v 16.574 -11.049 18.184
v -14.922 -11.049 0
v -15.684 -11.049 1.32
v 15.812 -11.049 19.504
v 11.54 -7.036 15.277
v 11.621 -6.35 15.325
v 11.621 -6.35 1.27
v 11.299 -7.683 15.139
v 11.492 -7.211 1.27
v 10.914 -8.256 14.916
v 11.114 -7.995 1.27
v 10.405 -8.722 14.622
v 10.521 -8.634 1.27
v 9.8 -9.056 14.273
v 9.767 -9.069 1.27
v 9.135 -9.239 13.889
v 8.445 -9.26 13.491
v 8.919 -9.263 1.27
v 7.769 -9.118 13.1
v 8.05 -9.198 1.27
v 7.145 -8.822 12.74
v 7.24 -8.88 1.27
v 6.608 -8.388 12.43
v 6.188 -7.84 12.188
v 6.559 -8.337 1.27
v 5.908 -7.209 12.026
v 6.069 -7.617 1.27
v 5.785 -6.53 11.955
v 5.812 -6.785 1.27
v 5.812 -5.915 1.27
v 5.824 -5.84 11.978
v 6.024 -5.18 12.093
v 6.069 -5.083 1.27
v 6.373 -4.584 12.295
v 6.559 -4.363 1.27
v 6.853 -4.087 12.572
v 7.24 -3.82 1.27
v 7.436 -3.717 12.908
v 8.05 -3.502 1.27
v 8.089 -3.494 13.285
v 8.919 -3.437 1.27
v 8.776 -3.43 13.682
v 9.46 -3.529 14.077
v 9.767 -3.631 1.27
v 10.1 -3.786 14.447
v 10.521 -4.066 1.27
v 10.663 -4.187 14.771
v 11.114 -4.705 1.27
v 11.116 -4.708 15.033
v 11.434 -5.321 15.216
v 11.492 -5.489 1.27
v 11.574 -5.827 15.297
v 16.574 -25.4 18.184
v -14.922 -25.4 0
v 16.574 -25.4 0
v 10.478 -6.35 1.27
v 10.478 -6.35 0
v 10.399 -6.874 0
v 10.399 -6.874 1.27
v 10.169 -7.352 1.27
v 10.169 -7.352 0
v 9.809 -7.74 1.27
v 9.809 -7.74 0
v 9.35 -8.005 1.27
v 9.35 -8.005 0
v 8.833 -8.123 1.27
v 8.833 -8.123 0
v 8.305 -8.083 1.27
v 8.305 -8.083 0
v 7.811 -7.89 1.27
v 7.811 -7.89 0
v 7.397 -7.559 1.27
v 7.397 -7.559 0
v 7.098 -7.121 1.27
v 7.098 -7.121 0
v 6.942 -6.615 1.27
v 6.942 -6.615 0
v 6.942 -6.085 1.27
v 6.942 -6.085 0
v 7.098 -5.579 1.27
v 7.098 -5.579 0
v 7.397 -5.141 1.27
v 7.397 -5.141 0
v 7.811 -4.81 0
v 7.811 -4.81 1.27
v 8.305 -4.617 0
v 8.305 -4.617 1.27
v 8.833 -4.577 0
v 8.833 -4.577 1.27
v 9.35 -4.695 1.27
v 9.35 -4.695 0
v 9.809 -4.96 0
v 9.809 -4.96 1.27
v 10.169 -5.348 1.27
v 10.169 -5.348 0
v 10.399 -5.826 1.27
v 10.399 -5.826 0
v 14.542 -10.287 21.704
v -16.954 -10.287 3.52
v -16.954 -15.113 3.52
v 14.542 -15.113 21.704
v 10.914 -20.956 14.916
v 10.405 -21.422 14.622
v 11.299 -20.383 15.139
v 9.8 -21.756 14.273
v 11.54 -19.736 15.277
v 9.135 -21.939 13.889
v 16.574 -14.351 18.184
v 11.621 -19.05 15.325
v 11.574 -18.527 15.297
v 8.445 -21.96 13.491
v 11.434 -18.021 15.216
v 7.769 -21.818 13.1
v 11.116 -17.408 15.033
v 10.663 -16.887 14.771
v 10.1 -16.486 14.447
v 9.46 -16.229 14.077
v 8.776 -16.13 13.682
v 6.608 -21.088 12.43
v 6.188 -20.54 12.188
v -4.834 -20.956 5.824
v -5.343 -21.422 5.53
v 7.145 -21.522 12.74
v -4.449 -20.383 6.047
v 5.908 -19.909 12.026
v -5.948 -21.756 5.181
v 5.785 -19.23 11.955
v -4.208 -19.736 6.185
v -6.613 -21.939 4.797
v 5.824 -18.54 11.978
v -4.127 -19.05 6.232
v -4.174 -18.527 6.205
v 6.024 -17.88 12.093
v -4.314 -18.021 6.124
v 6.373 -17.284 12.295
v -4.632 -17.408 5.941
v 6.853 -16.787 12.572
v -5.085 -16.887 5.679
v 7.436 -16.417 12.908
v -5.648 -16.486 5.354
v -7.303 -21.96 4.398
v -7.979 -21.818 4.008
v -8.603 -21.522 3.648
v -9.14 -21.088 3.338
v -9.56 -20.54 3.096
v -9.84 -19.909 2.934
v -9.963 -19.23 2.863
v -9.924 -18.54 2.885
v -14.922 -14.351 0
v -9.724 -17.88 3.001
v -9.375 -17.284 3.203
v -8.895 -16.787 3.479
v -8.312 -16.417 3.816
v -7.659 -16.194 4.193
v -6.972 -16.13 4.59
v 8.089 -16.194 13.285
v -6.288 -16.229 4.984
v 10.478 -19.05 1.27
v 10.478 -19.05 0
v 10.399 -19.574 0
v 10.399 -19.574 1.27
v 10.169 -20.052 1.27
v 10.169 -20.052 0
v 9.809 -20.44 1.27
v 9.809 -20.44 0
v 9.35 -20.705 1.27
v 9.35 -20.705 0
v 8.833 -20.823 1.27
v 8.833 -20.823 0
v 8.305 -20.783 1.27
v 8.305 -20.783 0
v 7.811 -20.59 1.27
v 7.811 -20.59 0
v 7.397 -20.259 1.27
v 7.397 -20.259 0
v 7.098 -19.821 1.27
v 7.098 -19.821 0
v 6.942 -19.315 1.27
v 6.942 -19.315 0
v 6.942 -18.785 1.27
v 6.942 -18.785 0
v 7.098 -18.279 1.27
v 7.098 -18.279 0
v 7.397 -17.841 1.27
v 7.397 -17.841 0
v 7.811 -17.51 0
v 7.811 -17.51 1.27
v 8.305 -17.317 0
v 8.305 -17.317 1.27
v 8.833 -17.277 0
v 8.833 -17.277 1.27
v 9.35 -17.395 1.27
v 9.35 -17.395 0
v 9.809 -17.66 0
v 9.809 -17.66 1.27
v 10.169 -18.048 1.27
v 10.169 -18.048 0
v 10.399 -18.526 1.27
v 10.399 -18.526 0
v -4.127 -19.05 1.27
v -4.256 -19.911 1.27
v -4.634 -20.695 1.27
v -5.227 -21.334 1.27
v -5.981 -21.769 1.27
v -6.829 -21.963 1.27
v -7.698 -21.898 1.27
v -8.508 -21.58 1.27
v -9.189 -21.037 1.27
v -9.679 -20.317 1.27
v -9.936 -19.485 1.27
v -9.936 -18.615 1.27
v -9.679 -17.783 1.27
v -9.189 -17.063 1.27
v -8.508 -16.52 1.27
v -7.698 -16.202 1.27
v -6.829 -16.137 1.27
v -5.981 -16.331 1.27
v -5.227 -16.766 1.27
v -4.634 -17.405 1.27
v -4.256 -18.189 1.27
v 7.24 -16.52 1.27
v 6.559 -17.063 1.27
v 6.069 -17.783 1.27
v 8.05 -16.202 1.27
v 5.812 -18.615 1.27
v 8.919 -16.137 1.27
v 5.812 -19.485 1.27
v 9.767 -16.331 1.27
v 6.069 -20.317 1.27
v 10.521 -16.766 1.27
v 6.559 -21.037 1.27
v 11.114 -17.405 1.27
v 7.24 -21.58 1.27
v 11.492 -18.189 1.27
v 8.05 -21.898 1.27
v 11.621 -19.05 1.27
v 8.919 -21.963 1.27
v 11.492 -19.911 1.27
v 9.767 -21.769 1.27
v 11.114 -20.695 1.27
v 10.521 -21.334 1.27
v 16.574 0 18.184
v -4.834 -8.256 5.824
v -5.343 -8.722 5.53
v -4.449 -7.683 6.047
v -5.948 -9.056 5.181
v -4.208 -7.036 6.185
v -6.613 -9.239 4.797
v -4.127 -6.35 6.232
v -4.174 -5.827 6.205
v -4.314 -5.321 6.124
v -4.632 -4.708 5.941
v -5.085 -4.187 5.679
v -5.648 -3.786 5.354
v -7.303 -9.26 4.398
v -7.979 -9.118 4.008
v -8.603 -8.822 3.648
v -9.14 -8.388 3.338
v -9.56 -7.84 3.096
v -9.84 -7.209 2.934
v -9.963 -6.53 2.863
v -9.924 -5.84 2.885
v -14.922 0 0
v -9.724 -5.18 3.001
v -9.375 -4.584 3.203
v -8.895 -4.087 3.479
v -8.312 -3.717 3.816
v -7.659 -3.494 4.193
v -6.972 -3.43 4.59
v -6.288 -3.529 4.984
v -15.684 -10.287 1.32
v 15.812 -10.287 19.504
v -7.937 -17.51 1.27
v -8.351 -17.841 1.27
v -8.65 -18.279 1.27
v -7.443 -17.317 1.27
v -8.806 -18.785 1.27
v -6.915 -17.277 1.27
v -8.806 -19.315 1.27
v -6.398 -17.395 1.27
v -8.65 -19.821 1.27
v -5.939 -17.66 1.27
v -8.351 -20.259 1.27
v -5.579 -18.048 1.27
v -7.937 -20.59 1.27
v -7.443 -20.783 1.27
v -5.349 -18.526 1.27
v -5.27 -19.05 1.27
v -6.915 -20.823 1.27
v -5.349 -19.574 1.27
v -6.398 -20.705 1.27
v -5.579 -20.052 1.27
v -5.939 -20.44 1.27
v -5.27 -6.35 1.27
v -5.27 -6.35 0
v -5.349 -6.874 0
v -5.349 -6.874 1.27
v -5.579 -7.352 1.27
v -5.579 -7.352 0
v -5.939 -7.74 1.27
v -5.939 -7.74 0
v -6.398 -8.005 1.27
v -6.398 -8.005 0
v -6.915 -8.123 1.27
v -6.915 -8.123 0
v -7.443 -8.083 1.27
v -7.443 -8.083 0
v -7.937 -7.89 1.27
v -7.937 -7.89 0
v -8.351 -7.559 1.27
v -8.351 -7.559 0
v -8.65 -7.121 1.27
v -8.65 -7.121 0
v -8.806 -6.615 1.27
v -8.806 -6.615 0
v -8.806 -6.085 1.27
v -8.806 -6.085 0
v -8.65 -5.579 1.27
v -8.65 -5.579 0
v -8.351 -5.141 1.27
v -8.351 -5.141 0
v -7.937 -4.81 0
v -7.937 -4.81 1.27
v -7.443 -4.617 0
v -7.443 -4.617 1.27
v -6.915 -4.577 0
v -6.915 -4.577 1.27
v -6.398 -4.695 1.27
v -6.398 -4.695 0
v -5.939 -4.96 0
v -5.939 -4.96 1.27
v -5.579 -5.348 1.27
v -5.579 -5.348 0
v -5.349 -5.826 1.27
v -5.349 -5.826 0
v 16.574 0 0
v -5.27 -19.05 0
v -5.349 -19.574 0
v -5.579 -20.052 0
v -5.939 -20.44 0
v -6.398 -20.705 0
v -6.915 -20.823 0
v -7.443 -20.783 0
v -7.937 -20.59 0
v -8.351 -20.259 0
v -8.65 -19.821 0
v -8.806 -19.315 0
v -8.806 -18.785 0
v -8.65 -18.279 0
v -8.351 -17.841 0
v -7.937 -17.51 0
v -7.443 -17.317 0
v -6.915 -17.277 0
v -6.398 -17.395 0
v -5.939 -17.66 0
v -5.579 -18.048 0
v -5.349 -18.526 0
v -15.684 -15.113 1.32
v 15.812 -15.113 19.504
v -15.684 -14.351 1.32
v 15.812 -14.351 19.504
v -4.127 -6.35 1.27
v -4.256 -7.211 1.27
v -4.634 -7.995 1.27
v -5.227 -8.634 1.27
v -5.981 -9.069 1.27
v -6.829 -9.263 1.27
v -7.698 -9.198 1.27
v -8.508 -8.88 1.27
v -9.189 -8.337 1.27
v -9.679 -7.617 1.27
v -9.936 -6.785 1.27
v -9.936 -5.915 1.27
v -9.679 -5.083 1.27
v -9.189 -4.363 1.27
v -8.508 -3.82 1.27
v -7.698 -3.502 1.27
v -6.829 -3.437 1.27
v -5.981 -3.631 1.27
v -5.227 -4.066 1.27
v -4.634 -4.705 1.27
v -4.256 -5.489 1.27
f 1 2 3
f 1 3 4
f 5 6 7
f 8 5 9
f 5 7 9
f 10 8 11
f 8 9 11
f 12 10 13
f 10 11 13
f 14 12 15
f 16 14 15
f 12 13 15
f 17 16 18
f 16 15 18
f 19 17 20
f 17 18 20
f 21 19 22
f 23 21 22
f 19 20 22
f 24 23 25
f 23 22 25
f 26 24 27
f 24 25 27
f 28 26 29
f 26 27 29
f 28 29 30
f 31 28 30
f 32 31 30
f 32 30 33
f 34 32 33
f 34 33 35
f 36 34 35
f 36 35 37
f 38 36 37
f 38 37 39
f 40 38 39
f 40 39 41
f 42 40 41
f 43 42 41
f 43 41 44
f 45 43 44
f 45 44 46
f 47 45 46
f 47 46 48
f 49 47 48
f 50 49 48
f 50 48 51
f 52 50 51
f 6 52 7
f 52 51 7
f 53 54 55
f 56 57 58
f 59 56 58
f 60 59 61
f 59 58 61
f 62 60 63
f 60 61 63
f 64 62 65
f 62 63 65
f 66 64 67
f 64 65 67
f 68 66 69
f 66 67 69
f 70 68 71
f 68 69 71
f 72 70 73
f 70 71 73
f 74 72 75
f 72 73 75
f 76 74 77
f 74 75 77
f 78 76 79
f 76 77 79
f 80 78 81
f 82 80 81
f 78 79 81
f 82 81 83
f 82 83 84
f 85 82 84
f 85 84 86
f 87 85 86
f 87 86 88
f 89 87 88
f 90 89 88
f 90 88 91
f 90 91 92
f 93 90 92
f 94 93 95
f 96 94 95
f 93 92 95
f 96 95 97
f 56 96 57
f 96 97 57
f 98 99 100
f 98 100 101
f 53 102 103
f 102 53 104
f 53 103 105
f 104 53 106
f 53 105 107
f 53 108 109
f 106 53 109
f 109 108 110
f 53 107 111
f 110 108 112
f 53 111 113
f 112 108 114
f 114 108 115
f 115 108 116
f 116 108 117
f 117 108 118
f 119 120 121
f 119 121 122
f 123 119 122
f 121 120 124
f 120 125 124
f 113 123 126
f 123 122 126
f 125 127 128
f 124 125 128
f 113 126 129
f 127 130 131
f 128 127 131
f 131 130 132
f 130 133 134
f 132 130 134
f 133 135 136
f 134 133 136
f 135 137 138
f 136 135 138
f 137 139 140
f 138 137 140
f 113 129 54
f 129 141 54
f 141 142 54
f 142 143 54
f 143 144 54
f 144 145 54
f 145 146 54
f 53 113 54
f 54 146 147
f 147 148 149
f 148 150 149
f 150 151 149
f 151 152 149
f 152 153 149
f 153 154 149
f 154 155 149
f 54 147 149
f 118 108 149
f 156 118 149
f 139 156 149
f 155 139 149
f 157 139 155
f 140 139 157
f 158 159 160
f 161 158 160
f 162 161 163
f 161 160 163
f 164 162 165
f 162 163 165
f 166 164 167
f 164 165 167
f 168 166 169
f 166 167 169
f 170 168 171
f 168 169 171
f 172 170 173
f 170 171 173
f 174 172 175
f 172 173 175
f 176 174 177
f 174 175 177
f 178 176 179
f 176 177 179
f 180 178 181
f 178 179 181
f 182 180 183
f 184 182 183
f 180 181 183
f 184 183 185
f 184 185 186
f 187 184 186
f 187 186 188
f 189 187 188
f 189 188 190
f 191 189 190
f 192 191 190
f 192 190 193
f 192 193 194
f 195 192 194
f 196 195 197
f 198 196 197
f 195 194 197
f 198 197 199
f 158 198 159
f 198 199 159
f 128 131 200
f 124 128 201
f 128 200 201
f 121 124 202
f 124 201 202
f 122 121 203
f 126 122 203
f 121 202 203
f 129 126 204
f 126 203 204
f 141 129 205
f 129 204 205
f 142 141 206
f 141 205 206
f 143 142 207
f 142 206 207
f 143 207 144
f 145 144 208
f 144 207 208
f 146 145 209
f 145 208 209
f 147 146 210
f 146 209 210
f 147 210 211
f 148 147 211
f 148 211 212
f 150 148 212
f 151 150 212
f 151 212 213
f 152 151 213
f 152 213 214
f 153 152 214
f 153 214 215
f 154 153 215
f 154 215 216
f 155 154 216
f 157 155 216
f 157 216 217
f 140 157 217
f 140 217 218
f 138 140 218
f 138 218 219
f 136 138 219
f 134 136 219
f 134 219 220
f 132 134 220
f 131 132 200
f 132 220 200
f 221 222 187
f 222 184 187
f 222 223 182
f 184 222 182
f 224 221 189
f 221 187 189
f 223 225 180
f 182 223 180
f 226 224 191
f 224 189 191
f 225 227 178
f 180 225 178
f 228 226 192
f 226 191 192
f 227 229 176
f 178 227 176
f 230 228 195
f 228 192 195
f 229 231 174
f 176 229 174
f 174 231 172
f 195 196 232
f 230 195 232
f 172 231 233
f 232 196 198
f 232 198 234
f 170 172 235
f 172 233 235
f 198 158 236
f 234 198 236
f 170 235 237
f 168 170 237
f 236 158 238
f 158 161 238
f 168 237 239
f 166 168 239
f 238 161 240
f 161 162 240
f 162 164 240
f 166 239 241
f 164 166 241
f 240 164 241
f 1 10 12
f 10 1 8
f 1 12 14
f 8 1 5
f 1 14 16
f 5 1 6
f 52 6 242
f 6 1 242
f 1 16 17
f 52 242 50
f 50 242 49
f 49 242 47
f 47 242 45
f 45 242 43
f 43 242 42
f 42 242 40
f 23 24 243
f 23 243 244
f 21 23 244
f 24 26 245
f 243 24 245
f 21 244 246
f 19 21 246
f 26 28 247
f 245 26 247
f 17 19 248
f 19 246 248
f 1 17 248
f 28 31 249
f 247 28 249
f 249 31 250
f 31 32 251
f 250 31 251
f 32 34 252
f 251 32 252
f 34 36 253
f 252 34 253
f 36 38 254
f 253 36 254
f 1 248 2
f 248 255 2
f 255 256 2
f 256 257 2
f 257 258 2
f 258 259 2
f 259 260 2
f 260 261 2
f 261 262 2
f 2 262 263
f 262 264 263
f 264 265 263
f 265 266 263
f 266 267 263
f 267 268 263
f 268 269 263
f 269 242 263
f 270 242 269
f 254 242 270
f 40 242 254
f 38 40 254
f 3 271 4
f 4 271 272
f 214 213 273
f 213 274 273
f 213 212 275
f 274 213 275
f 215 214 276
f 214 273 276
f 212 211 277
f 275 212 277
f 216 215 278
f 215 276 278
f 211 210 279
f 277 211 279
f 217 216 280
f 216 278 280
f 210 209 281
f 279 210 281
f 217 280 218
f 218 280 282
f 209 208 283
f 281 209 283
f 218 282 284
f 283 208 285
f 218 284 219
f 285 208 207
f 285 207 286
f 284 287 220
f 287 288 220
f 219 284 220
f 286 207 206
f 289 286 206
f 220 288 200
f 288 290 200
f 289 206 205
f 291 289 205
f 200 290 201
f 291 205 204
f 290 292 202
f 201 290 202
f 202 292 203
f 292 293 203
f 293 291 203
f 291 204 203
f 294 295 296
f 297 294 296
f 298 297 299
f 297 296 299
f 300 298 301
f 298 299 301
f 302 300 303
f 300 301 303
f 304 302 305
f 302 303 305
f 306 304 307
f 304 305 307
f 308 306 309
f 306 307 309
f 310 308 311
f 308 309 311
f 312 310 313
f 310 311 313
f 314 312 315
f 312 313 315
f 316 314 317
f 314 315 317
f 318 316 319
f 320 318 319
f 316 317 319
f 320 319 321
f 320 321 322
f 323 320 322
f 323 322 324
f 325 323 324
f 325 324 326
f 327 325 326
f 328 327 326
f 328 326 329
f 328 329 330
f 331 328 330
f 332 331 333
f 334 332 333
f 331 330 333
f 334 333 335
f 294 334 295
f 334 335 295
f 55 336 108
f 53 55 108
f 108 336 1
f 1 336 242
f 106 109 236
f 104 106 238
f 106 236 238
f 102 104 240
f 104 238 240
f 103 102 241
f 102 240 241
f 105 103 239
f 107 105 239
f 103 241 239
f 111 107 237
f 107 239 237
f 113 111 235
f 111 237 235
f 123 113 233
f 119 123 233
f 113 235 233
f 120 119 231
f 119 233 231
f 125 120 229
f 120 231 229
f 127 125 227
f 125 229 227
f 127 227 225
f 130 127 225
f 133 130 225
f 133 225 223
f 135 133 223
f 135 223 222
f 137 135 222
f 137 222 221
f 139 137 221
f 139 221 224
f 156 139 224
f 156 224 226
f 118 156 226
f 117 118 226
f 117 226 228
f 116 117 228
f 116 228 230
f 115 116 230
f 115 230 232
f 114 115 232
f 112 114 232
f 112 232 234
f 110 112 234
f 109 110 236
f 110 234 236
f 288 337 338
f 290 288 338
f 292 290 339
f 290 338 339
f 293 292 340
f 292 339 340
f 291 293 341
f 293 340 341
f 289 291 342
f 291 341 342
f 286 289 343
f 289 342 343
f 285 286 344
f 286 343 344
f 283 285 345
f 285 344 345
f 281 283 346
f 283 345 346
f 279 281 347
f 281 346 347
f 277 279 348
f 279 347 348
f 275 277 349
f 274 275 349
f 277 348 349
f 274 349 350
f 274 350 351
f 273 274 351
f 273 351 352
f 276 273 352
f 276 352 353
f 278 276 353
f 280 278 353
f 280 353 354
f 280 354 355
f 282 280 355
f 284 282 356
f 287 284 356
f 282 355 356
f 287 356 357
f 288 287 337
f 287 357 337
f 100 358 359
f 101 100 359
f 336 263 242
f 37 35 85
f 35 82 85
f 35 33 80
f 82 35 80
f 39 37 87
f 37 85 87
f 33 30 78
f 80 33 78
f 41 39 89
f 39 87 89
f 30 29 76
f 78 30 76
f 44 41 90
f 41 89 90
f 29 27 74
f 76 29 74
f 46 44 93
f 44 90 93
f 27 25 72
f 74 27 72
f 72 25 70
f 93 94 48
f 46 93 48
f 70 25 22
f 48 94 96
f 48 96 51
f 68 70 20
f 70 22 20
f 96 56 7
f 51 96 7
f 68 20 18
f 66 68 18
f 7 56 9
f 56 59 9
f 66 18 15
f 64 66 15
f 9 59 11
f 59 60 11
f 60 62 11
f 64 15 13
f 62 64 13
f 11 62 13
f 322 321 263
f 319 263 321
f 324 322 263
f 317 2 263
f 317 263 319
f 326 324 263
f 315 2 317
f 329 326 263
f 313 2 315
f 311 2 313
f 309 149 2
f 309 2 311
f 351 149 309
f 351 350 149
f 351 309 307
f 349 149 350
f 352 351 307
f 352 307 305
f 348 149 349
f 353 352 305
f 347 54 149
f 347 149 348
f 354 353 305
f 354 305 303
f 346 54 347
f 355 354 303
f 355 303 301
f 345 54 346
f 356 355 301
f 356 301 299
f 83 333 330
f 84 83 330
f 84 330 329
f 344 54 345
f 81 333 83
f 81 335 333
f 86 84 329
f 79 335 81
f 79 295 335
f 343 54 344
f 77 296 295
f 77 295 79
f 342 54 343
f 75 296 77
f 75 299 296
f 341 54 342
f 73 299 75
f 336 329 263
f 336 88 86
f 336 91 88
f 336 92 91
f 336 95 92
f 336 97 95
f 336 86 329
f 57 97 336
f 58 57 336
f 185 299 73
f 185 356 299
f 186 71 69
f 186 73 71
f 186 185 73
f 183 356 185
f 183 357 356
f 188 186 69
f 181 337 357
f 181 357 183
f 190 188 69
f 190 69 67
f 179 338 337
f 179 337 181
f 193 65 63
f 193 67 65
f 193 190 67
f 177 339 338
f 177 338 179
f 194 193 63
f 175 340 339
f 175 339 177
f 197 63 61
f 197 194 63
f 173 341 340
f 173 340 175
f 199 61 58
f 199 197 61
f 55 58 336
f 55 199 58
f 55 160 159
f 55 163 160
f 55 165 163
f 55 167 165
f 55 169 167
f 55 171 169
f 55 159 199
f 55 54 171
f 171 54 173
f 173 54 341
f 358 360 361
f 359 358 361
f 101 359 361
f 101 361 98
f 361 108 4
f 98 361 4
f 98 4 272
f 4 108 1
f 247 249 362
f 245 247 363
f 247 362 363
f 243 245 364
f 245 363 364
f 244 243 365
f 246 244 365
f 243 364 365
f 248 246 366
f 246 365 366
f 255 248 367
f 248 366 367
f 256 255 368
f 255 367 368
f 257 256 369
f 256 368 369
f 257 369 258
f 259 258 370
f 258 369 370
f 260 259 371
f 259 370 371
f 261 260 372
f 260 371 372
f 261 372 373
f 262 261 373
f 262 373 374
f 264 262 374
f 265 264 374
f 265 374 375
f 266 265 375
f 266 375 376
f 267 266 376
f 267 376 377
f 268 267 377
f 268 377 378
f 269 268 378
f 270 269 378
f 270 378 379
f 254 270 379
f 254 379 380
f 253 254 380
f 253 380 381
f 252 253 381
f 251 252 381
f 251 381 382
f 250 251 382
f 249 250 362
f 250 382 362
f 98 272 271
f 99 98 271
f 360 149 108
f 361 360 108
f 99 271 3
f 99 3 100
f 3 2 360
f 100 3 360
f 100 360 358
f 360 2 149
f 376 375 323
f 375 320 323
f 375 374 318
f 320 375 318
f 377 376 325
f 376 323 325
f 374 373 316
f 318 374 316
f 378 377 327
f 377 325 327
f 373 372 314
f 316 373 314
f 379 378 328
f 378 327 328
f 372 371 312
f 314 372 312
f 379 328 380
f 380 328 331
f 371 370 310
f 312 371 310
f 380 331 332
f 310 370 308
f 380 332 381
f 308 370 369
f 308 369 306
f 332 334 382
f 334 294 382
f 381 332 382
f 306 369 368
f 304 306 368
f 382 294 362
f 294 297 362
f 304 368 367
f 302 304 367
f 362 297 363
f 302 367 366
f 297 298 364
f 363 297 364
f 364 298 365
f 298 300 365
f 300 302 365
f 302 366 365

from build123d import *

# Parameters (mm, degrees)
F1_DEPTH = 25.4
F2_R     = 2.921
F2_R_2   = 1.778
F3_DEPTH = 25.4
F4_DEPTH = 1.27
F5_W     = 36.3684481568
F5_H     = 3.302
F6_DEPTH = 1.524
F8_DEPTH = 2.54


with BuildPart() as f1:
    # F0 (on Front) → F1 (new body)
    with BuildSketch(Plane.XZ):
        Polygon((16.5742833321, 18.1842240784), (-14.9217166679, 0), (16.5742833321, 0), align=None)
    extrude(amount=F1_DEPTH)

    # F2 (on face) → F3 (cut)
    with BuildSketch(Plane(origin=(0, 0, 0), x_dir=(1, 0, 0), z_dir=(0, 0, -1))):
        with Locations((-7.0477166679, 19.05)):
            Circle(F2_R)
        with Locations((-7.0477166679, 19.05)):
            Circle(F2_R_2, mode=Mode.SUBTRACT)
        with Locations((8.7002833321, 19.05)):
            Circle(F2_R)
        with Locations((8.7002833321, 19.05)):
            Circle(F2_R_2, mode=Mode.SUBTRACT)
        with Locations((-7.0477166679, 6.35)):
            Circle(F2_R)
        with Locations((-7.0477166679, 6.35)):
            Circle(F2_R_2, mode=Mode.SUBTRACT)
        with Locations((8.7002833321, 6.35)):
            Circle(F2_R)
        with Locations((8.7002833321, 6.35)):
            Circle(F2_R_2, mode=Mode.SUBTRACT)
        with Locations((-7.0477166679, 19.05)):
            Circle(F2_R_2)
        with Locations((8.7002833321, 19.05)):
            Circle(F2_R_2)
        with Locations((-7.0477166679, 6.35)):
            Circle(F2_R_2)
        with Locations((8.7002833321, 6.35)):
            Circle(F2_R_2)
    extrude(amount=-F3_DEPTH, mode=Mode.SUBTRACT)

    # F2 (on face) → F4 (join)
    with BuildSketch(Plane(origin=(0, 0, 0), x_dir=(1, 0, 0), z_dir=(0, 0, -1))):
        with Locations((-7.0477166679, 19.05)):
            Circle(F2_R)
        with Locations((-7.0477166679, 19.05)):
            Circle(F2_R_2, mode=Mode.SUBTRACT)
        with Locations((8.7002833321, 19.05)):
            Circle(F2_R)
        with Locations((8.7002833321, 19.05)):
            Circle(F2_R_2, mode=Mode.SUBTRACT)
        with Locations((-7.0477166679, 6.35)):
            Circle(F2_R)
        with Locations((-7.0477166679, 6.35)):
            Circle(F2_R_2, mode=Mode.SUBTRACT)
        with Locations((8.7002833321, 6.35)):
            Circle(F2_R)
        with Locations((8.7002833321, 6.35)):
            Circle(F2_R_2, mode=Mode.SUBTRACT)
    extrude(amount=-F4_DEPTH)

    # F5 (on face) → F6 (join)
    with BuildSketch(Plane(origin=(-3.730429167, 0, 6.4612928512), x_dir=(0.8660254038, 0, 0.5), z_dir=(-0.5, 0, 0.8660254038))):
        with Locations((5.2616383759, -12.7)):
            Rectangle(F5_W, F5_H)
    extrude(amount=F6_DEPTH)

    # F7 (on face) → F8 (join)
    with BuildSketch(Plane(origin=(-4.492429167, 0, 7.7811155666), x_dir=(0.8660254038, 0, 0.5), z_dir=(-0.5, 0, 0.8660254038))):
        Polygon((-12.9225857025, -10.287), (-12.9225857025, -12.7), (-12.9225857025, -15.113), (23.4458624543, -15.113), (23.4458624543, -12.7), (23.4458624543, -10.287), align=None)
    extrude(amount=F8_DEPTH)


solid = f1.part
